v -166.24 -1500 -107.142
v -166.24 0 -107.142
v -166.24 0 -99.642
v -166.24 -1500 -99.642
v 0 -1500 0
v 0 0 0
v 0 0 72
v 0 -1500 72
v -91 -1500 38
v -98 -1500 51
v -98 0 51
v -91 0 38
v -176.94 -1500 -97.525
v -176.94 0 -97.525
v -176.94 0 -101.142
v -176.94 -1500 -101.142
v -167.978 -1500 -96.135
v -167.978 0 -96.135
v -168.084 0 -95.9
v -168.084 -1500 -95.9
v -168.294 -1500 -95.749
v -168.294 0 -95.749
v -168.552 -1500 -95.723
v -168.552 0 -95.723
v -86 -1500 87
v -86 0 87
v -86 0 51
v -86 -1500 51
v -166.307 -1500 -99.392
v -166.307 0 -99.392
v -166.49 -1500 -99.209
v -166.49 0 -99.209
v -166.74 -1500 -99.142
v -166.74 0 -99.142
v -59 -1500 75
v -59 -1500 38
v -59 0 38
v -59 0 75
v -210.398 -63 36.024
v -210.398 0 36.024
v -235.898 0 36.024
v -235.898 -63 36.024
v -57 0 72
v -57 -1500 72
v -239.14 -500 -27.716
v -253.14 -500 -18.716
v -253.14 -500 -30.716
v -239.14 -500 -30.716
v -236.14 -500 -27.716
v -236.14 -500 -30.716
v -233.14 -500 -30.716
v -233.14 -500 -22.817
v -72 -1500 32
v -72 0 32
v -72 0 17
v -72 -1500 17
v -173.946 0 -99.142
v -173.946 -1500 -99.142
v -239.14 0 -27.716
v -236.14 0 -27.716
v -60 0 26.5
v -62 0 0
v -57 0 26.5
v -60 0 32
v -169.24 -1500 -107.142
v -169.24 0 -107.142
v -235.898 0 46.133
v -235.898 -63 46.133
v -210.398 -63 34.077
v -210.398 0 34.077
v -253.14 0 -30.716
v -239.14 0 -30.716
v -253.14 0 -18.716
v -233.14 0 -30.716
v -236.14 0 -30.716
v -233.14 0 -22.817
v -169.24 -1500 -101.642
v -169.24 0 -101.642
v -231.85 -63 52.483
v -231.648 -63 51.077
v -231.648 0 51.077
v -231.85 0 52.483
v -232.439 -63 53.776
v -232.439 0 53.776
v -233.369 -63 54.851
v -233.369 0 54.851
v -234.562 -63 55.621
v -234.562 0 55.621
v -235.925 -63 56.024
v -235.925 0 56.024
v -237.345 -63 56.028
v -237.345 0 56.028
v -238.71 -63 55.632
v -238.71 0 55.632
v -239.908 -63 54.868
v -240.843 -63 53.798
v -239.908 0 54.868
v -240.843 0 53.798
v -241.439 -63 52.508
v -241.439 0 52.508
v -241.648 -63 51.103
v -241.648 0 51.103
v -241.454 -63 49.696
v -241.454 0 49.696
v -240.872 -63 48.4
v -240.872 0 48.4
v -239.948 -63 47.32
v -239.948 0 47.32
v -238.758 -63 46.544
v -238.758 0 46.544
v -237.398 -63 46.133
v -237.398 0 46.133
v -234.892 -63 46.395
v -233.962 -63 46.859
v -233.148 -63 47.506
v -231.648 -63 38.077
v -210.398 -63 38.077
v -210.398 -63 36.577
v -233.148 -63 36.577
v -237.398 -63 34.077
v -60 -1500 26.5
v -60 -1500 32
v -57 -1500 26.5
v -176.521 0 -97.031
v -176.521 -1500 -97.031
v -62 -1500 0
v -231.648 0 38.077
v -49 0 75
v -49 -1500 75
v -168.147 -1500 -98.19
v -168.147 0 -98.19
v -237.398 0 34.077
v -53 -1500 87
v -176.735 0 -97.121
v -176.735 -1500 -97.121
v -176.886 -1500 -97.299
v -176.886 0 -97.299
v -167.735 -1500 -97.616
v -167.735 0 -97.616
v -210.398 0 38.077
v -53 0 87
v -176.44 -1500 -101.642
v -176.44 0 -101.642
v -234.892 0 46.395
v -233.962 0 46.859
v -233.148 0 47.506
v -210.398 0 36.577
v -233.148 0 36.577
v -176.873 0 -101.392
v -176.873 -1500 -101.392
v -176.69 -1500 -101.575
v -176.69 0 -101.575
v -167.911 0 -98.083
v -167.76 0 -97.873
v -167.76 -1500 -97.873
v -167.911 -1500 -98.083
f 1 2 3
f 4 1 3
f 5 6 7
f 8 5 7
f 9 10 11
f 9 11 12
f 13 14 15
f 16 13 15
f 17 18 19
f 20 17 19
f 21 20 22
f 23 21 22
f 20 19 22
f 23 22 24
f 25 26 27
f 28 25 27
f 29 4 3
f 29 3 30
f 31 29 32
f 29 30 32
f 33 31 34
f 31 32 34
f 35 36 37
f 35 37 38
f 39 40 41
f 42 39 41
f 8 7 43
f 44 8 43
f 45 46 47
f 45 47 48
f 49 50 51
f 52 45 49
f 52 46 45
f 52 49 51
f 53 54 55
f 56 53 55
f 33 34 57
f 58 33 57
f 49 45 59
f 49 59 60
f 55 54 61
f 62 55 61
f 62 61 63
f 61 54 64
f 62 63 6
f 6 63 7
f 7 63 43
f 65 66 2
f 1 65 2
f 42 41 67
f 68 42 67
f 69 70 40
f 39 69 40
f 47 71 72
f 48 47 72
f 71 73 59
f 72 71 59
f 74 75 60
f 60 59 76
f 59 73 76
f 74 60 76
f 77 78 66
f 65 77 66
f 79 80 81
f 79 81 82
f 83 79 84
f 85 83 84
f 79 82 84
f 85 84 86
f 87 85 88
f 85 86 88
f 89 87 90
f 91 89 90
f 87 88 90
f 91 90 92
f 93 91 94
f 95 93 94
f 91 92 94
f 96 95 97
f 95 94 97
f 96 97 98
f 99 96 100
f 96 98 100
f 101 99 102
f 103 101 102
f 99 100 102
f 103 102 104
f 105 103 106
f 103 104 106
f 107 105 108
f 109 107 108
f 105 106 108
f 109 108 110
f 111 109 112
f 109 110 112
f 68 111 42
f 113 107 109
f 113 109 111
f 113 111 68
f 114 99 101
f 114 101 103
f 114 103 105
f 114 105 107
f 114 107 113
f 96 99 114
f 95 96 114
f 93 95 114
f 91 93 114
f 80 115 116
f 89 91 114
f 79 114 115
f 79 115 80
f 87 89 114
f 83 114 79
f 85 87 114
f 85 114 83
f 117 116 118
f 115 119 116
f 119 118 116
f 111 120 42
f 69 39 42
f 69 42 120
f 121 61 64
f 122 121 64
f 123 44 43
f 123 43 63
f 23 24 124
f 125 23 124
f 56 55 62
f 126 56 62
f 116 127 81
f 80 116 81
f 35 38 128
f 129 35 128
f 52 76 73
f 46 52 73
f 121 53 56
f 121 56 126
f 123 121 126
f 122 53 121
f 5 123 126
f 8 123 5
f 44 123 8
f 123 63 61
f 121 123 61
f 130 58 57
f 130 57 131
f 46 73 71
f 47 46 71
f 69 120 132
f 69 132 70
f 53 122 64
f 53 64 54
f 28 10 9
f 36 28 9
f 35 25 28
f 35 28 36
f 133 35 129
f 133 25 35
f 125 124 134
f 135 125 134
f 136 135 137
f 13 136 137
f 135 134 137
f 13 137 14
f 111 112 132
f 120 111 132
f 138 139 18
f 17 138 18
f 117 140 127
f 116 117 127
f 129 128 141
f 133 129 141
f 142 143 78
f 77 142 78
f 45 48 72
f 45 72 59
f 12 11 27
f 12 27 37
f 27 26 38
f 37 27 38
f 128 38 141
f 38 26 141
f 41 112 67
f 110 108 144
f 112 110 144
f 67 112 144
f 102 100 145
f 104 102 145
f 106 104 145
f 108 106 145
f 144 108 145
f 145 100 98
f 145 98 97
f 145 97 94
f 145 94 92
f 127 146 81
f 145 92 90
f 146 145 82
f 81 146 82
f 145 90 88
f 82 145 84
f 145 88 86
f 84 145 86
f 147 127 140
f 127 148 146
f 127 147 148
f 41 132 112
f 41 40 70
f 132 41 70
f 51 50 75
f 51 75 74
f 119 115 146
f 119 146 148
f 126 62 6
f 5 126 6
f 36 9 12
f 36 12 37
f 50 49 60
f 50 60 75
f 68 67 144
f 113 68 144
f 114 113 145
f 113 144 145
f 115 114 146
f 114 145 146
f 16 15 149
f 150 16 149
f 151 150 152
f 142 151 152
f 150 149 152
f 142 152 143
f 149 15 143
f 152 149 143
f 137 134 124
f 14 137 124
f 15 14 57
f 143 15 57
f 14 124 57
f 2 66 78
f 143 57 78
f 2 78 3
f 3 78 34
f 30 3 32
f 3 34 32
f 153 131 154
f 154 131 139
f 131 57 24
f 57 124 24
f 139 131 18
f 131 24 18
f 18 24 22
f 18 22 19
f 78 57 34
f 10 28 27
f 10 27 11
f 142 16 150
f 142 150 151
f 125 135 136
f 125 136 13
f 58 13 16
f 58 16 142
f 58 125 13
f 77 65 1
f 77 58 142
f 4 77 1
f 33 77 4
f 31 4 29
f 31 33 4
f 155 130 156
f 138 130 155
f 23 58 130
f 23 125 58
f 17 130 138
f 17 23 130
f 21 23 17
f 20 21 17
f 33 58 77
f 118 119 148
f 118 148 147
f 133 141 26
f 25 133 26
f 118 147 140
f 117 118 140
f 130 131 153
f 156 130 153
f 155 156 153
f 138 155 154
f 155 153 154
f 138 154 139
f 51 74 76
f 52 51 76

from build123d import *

# Parameters (mm, degrees)
F3_DEPTH = 1500
F4_DEPTH = 63
F6_DEPTH = 1500
F8_DEPTH = 500


with BuildPart() as f3:
    # F0 (on Front) + F1 (on Front) → F3 (new body)
    with BuildSketch(Plane.XZ):
        Polygon((0, 72), (-57, 72), (-57, 32), (-57, 26.5), (-60, 26.5), (-60, 32), (-72, 32), (-72, 17), (-62, 0), (0, 0), align=None)
    with BuildSketch(Plane.XZ):
        Polygon((-59, 75), (-49, 75), (-53, 87), (-86, 87), (-86, 51), (-98, 51), (-91, 38), (-59, 38), align=None)
    extrude(amount=F3_DEPTH)


with BuildPart() as f4:
    # F2 (on Front) → F4 (new body)
    with BuildSketch(Plane.XZ):
        with BuildLine():
            Line((-235.898336, 36.02443), (-235.898336, 46.133099))
            ThreePointArc((-235.898336, 46.133099), (-234.415241, 46.602908), (-233.148336, 47.505815))
            Line((-233.148336, 47.505815), (-233.148336, 36.576529))
            Line((-233.148336, 36.576529), (-210.398336, 36.576529))
            Line((-210.398336, 36.576529), (-210.398336, 38.076529))
            Line((-210.398336, 38.076529), (-231.648336, 38.076529))
            Line((-231.648336, 38.076529), (-231.648336, 51.076529))
            ThreePointArc((-231.648336, 51.076529), (-239.907937, 54.867967), (-237.398336, 46.133099))
            Line((-237.398336, 46.133099), (-237.398336, 34.076529))
            Line((-237.398336, 34.076529), (-210.398336, 34.076529))
            Line((-210.398336, 34.076529), (-210.398336, 36.02443))
            Line((-210.398336, 36.02443), (-235.898336, 36.02443))
        make_face()
    extrude(amount=F4_DEPTH)


with BuildPart() as f6:
    # F5 (on Front) → F6 (new body)
    with BuildSketch(Plane.XZ):
        with BuildLine():
            Line((-169.239743, -101.642079), (-169.239743, -107.142079))
            Line((-169.239743, -107.142079), (-166.239743, -107.142079))
            Line((-166.239743, -107.142079), (-166.239743, -99.642079))
            ThreePointArc((-166.239743, -99.642079), (-166.38619, -99.288526), (-166.739743, -99.142079))
            Line((-166.739743, -99.142079), (-173.945686, -99.142079))
            Line((-173.945686, -99.142079), (-168.147011, -98.190057))
            ThreePointArc((-168.147011, -98.190057), (-167.821854, -97.988266), (-167.734621, -97.615657))
            Line((-167.734621, -97.615657), (-167.977637, -96.135474))
            ThreePointArc((-167.977637, -96.135474), (-168.179428, -95.810317), (-168.552036, -95.723084))
            Line((-168.552036, -95.723084), (-176.520749, -97.031382))
            ThreePointArc((-176.520749, -97.031382), (-176.820862, -97.201127), (-176.939743, -97.524776))
            Line((-176.939743, -97.524776), (-176.939743, -101.142079))
            ThreePointArc((-176.939743, -101.142079), (-176.793297, -101.495633), (-176.439743, -101.642079))
            Line((-176.439743, -101.642079), (-169.239743, -101.642079))
        make_face()
    extrude(amount=F6_DEPTH)


with BuildPart() as f8:
    # F7 (on Front) → F8 (new body)
    with BuildSketch(Plane.XZ):
        Polygon((-233.140015, -22.816613), (-253.140015, -18.716228), (-253.140015, -30.716228), (-239.140015, -30.716228), (-239.140015, -27.716228), (-236.140015, -27.716228), (-236.140015, -30.716228), (-233.140015, -30.716228), align=None)
    extrude(amount=F8_DEPTH)


solid = Compound([f3.part, f4.part, f6.part, f8.part])
